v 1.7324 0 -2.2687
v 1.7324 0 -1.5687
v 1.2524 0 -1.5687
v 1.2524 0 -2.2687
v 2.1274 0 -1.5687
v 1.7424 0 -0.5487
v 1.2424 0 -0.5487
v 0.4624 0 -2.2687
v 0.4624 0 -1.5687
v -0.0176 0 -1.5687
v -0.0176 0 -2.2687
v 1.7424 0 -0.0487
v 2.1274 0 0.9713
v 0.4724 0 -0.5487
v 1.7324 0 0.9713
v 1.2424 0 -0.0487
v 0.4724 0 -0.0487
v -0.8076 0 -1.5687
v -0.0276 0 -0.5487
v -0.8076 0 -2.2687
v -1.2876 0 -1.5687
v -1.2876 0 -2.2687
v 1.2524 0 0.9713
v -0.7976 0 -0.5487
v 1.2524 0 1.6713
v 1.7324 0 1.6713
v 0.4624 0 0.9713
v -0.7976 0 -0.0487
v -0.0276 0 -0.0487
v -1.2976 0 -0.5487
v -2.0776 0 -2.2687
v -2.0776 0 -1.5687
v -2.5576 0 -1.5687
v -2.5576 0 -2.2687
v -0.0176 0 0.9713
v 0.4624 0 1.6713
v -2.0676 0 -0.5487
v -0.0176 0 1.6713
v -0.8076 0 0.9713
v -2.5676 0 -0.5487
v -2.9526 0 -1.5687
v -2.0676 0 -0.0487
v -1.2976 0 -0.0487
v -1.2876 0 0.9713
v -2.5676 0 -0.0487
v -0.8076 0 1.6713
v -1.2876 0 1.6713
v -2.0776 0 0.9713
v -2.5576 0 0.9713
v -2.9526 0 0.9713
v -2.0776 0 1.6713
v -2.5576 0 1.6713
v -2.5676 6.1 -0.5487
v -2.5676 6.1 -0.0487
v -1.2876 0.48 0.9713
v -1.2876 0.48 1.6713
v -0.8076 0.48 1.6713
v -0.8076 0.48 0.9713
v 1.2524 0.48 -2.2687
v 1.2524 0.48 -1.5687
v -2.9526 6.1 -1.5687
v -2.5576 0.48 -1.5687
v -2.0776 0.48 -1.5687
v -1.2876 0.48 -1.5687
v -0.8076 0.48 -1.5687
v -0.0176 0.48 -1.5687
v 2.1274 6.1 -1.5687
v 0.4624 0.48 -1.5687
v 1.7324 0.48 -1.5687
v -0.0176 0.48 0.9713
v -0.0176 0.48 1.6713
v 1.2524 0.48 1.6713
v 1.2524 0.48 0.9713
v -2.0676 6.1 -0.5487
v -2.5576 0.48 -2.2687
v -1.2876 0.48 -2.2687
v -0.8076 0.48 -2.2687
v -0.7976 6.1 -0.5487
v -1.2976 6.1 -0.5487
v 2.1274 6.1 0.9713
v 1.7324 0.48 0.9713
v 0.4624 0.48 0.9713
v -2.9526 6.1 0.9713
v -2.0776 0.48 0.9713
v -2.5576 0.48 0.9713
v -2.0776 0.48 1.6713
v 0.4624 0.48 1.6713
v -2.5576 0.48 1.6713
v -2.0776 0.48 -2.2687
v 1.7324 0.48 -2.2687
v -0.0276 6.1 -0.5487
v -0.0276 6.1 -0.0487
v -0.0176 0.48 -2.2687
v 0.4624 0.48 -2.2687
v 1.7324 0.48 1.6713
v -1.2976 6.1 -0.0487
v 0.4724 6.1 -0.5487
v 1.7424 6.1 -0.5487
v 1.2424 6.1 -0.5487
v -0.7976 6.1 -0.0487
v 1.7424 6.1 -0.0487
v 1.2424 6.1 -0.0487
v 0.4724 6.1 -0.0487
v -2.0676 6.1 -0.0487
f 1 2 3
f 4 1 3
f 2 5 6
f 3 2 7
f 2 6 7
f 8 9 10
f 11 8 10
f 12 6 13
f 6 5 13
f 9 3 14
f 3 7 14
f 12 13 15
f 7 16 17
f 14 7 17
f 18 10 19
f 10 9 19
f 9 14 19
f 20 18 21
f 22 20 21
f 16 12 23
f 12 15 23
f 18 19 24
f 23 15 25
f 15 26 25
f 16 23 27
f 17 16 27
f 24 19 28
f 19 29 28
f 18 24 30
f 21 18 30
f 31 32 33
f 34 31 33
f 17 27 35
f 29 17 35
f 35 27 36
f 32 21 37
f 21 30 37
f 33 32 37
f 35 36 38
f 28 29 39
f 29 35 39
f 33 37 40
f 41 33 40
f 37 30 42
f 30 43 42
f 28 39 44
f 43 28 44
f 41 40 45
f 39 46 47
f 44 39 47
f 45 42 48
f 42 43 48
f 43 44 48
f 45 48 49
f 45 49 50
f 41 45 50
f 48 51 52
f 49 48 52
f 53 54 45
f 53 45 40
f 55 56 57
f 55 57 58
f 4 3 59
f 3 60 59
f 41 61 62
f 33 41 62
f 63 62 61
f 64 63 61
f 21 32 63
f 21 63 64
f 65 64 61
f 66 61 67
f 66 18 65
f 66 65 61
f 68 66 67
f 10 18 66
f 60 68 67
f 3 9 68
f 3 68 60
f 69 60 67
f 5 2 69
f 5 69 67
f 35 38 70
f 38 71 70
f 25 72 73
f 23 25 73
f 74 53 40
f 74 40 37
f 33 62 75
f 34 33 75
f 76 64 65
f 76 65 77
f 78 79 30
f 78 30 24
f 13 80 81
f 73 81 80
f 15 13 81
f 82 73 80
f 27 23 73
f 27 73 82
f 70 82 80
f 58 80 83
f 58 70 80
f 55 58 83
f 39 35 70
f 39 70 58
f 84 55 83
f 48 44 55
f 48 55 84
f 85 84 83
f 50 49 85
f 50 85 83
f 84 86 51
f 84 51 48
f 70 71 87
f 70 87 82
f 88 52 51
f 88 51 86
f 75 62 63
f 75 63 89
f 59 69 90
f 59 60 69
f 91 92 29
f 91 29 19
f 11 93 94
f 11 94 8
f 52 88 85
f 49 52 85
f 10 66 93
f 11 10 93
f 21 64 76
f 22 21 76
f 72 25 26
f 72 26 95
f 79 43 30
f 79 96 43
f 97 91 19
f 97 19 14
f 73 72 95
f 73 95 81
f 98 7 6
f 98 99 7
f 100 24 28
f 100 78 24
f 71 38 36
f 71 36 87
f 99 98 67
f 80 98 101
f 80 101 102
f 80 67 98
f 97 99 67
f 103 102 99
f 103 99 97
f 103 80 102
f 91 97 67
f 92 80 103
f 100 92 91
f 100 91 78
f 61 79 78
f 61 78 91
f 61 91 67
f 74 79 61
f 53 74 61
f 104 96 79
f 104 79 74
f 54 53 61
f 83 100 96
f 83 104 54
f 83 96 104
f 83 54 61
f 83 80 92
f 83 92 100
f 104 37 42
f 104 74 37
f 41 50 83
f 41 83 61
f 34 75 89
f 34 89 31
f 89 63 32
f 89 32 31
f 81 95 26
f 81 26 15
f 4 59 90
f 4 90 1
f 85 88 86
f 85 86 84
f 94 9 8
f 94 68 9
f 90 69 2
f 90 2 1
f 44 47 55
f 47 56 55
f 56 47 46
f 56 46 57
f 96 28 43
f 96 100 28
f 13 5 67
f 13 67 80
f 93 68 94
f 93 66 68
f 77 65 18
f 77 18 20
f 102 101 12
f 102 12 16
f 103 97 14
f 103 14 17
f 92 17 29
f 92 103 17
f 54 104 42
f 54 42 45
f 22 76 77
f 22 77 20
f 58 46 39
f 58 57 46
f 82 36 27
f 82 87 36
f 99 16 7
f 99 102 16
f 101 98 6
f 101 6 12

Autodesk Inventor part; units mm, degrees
ref_plane "YZ Plane" through (0, 0, 0) normal (1, 0, 0) x (0, 1, 0)
ref_plane "XZ Plane" through (0, 0, 0) normal (0, 1, 0) x (-1, 0, 0)
ref_plane "XY Plane" through (0, 0, 0) normal (0, 0, 1) x (1, 0, 0)
sketch "Sketch1" plane through (0, 0, 0) normal (0, 1, 0) x (-1, 0, 0)
  line L0 (-2.1274, 0.9713) -> (2.9526, 0.9713)
  line L1 (2.9526, 0.9713) -> (2.9526, -1.5687)
  line L2 (2.9526, -1.5687) -> (-2.1274, -1.5687)
  line L3 (-2.1274, -1.5687) -> (-2.1274, 0.9713)
  point P0 (0, 0)
  dimension "d0" = 5.08
  dimension "d1" = 2.54
extrude "Extrusion1" add sketch "Sketch1" along normal blind 6.1
ref_plane "Work Plane1" through (1.4924, 0, 0.9713) normal (1, 0, 0) x (0, 0, -1)
sketch "Sketch2" plane through (1.4924, 0, 0.9713) normal (1, 0, 0) x (0, 0, -1)
  line L0 (3.24, 0) -> (-0.7, 0)
  line L1 (-0.7, 0) -> (-0.7, 0.48)
  line L2 (-0.7, 0.48) -> (3.24, 0.48)
  line L3 (3.24, 0.48) -> (3.24, 0)
  line L4 (0, 0) -> (0, 6.1) projected
  point P0 (0.9713, 0)
  dimension "d5" = 3.94
  dimension "d6" = 0.7
  dimension "d7" = 0.48
extrude "Extrusion2" add sketch "Sketch2" along normal mid plane 0.48
pattern_linear "Rectangular Pattern1" count 4 spacing 1.27 along (-1, 0, 0) of "Extrusion2"
sketch "Sketch3" plane through (0, 6.1, 0) normal (0, 1, 0) x (1, 0, 0)
  line L0 (2.1274, 1.5687) -> (-2.9526, 1.5687) projected
  line L1 (-2.9526, 1.5687) -> (-2.9526, -0.9713) projected
  line L2 (-2.5676, 0.5487) -> (-2.0676, 0.5487)
  line L3 (-2.0676, 0.5487) -> (-2.0676, 0.0487)
  line L4 (-2.0676, 0.0487) -> (-2.5676, 0.0487)
  line L5 (-2.5676, 0.0487) -> (-2.5676, 0.5487)
  point P0 (0, 0)
  dimension "d13" = 0.5
  dimension "d14" = 0.5
  dimension "d15" = 0.385
  dimension "d16" = 1.02
extrude "Extrusion3" cut sketch "Sketch3" against normal through all
pattern_linear "Rectangular Pattern2" count 4 spacing 1.27 along (1, 0, 0) of "Extrusion3"
properties part number "Recepticle_127"
